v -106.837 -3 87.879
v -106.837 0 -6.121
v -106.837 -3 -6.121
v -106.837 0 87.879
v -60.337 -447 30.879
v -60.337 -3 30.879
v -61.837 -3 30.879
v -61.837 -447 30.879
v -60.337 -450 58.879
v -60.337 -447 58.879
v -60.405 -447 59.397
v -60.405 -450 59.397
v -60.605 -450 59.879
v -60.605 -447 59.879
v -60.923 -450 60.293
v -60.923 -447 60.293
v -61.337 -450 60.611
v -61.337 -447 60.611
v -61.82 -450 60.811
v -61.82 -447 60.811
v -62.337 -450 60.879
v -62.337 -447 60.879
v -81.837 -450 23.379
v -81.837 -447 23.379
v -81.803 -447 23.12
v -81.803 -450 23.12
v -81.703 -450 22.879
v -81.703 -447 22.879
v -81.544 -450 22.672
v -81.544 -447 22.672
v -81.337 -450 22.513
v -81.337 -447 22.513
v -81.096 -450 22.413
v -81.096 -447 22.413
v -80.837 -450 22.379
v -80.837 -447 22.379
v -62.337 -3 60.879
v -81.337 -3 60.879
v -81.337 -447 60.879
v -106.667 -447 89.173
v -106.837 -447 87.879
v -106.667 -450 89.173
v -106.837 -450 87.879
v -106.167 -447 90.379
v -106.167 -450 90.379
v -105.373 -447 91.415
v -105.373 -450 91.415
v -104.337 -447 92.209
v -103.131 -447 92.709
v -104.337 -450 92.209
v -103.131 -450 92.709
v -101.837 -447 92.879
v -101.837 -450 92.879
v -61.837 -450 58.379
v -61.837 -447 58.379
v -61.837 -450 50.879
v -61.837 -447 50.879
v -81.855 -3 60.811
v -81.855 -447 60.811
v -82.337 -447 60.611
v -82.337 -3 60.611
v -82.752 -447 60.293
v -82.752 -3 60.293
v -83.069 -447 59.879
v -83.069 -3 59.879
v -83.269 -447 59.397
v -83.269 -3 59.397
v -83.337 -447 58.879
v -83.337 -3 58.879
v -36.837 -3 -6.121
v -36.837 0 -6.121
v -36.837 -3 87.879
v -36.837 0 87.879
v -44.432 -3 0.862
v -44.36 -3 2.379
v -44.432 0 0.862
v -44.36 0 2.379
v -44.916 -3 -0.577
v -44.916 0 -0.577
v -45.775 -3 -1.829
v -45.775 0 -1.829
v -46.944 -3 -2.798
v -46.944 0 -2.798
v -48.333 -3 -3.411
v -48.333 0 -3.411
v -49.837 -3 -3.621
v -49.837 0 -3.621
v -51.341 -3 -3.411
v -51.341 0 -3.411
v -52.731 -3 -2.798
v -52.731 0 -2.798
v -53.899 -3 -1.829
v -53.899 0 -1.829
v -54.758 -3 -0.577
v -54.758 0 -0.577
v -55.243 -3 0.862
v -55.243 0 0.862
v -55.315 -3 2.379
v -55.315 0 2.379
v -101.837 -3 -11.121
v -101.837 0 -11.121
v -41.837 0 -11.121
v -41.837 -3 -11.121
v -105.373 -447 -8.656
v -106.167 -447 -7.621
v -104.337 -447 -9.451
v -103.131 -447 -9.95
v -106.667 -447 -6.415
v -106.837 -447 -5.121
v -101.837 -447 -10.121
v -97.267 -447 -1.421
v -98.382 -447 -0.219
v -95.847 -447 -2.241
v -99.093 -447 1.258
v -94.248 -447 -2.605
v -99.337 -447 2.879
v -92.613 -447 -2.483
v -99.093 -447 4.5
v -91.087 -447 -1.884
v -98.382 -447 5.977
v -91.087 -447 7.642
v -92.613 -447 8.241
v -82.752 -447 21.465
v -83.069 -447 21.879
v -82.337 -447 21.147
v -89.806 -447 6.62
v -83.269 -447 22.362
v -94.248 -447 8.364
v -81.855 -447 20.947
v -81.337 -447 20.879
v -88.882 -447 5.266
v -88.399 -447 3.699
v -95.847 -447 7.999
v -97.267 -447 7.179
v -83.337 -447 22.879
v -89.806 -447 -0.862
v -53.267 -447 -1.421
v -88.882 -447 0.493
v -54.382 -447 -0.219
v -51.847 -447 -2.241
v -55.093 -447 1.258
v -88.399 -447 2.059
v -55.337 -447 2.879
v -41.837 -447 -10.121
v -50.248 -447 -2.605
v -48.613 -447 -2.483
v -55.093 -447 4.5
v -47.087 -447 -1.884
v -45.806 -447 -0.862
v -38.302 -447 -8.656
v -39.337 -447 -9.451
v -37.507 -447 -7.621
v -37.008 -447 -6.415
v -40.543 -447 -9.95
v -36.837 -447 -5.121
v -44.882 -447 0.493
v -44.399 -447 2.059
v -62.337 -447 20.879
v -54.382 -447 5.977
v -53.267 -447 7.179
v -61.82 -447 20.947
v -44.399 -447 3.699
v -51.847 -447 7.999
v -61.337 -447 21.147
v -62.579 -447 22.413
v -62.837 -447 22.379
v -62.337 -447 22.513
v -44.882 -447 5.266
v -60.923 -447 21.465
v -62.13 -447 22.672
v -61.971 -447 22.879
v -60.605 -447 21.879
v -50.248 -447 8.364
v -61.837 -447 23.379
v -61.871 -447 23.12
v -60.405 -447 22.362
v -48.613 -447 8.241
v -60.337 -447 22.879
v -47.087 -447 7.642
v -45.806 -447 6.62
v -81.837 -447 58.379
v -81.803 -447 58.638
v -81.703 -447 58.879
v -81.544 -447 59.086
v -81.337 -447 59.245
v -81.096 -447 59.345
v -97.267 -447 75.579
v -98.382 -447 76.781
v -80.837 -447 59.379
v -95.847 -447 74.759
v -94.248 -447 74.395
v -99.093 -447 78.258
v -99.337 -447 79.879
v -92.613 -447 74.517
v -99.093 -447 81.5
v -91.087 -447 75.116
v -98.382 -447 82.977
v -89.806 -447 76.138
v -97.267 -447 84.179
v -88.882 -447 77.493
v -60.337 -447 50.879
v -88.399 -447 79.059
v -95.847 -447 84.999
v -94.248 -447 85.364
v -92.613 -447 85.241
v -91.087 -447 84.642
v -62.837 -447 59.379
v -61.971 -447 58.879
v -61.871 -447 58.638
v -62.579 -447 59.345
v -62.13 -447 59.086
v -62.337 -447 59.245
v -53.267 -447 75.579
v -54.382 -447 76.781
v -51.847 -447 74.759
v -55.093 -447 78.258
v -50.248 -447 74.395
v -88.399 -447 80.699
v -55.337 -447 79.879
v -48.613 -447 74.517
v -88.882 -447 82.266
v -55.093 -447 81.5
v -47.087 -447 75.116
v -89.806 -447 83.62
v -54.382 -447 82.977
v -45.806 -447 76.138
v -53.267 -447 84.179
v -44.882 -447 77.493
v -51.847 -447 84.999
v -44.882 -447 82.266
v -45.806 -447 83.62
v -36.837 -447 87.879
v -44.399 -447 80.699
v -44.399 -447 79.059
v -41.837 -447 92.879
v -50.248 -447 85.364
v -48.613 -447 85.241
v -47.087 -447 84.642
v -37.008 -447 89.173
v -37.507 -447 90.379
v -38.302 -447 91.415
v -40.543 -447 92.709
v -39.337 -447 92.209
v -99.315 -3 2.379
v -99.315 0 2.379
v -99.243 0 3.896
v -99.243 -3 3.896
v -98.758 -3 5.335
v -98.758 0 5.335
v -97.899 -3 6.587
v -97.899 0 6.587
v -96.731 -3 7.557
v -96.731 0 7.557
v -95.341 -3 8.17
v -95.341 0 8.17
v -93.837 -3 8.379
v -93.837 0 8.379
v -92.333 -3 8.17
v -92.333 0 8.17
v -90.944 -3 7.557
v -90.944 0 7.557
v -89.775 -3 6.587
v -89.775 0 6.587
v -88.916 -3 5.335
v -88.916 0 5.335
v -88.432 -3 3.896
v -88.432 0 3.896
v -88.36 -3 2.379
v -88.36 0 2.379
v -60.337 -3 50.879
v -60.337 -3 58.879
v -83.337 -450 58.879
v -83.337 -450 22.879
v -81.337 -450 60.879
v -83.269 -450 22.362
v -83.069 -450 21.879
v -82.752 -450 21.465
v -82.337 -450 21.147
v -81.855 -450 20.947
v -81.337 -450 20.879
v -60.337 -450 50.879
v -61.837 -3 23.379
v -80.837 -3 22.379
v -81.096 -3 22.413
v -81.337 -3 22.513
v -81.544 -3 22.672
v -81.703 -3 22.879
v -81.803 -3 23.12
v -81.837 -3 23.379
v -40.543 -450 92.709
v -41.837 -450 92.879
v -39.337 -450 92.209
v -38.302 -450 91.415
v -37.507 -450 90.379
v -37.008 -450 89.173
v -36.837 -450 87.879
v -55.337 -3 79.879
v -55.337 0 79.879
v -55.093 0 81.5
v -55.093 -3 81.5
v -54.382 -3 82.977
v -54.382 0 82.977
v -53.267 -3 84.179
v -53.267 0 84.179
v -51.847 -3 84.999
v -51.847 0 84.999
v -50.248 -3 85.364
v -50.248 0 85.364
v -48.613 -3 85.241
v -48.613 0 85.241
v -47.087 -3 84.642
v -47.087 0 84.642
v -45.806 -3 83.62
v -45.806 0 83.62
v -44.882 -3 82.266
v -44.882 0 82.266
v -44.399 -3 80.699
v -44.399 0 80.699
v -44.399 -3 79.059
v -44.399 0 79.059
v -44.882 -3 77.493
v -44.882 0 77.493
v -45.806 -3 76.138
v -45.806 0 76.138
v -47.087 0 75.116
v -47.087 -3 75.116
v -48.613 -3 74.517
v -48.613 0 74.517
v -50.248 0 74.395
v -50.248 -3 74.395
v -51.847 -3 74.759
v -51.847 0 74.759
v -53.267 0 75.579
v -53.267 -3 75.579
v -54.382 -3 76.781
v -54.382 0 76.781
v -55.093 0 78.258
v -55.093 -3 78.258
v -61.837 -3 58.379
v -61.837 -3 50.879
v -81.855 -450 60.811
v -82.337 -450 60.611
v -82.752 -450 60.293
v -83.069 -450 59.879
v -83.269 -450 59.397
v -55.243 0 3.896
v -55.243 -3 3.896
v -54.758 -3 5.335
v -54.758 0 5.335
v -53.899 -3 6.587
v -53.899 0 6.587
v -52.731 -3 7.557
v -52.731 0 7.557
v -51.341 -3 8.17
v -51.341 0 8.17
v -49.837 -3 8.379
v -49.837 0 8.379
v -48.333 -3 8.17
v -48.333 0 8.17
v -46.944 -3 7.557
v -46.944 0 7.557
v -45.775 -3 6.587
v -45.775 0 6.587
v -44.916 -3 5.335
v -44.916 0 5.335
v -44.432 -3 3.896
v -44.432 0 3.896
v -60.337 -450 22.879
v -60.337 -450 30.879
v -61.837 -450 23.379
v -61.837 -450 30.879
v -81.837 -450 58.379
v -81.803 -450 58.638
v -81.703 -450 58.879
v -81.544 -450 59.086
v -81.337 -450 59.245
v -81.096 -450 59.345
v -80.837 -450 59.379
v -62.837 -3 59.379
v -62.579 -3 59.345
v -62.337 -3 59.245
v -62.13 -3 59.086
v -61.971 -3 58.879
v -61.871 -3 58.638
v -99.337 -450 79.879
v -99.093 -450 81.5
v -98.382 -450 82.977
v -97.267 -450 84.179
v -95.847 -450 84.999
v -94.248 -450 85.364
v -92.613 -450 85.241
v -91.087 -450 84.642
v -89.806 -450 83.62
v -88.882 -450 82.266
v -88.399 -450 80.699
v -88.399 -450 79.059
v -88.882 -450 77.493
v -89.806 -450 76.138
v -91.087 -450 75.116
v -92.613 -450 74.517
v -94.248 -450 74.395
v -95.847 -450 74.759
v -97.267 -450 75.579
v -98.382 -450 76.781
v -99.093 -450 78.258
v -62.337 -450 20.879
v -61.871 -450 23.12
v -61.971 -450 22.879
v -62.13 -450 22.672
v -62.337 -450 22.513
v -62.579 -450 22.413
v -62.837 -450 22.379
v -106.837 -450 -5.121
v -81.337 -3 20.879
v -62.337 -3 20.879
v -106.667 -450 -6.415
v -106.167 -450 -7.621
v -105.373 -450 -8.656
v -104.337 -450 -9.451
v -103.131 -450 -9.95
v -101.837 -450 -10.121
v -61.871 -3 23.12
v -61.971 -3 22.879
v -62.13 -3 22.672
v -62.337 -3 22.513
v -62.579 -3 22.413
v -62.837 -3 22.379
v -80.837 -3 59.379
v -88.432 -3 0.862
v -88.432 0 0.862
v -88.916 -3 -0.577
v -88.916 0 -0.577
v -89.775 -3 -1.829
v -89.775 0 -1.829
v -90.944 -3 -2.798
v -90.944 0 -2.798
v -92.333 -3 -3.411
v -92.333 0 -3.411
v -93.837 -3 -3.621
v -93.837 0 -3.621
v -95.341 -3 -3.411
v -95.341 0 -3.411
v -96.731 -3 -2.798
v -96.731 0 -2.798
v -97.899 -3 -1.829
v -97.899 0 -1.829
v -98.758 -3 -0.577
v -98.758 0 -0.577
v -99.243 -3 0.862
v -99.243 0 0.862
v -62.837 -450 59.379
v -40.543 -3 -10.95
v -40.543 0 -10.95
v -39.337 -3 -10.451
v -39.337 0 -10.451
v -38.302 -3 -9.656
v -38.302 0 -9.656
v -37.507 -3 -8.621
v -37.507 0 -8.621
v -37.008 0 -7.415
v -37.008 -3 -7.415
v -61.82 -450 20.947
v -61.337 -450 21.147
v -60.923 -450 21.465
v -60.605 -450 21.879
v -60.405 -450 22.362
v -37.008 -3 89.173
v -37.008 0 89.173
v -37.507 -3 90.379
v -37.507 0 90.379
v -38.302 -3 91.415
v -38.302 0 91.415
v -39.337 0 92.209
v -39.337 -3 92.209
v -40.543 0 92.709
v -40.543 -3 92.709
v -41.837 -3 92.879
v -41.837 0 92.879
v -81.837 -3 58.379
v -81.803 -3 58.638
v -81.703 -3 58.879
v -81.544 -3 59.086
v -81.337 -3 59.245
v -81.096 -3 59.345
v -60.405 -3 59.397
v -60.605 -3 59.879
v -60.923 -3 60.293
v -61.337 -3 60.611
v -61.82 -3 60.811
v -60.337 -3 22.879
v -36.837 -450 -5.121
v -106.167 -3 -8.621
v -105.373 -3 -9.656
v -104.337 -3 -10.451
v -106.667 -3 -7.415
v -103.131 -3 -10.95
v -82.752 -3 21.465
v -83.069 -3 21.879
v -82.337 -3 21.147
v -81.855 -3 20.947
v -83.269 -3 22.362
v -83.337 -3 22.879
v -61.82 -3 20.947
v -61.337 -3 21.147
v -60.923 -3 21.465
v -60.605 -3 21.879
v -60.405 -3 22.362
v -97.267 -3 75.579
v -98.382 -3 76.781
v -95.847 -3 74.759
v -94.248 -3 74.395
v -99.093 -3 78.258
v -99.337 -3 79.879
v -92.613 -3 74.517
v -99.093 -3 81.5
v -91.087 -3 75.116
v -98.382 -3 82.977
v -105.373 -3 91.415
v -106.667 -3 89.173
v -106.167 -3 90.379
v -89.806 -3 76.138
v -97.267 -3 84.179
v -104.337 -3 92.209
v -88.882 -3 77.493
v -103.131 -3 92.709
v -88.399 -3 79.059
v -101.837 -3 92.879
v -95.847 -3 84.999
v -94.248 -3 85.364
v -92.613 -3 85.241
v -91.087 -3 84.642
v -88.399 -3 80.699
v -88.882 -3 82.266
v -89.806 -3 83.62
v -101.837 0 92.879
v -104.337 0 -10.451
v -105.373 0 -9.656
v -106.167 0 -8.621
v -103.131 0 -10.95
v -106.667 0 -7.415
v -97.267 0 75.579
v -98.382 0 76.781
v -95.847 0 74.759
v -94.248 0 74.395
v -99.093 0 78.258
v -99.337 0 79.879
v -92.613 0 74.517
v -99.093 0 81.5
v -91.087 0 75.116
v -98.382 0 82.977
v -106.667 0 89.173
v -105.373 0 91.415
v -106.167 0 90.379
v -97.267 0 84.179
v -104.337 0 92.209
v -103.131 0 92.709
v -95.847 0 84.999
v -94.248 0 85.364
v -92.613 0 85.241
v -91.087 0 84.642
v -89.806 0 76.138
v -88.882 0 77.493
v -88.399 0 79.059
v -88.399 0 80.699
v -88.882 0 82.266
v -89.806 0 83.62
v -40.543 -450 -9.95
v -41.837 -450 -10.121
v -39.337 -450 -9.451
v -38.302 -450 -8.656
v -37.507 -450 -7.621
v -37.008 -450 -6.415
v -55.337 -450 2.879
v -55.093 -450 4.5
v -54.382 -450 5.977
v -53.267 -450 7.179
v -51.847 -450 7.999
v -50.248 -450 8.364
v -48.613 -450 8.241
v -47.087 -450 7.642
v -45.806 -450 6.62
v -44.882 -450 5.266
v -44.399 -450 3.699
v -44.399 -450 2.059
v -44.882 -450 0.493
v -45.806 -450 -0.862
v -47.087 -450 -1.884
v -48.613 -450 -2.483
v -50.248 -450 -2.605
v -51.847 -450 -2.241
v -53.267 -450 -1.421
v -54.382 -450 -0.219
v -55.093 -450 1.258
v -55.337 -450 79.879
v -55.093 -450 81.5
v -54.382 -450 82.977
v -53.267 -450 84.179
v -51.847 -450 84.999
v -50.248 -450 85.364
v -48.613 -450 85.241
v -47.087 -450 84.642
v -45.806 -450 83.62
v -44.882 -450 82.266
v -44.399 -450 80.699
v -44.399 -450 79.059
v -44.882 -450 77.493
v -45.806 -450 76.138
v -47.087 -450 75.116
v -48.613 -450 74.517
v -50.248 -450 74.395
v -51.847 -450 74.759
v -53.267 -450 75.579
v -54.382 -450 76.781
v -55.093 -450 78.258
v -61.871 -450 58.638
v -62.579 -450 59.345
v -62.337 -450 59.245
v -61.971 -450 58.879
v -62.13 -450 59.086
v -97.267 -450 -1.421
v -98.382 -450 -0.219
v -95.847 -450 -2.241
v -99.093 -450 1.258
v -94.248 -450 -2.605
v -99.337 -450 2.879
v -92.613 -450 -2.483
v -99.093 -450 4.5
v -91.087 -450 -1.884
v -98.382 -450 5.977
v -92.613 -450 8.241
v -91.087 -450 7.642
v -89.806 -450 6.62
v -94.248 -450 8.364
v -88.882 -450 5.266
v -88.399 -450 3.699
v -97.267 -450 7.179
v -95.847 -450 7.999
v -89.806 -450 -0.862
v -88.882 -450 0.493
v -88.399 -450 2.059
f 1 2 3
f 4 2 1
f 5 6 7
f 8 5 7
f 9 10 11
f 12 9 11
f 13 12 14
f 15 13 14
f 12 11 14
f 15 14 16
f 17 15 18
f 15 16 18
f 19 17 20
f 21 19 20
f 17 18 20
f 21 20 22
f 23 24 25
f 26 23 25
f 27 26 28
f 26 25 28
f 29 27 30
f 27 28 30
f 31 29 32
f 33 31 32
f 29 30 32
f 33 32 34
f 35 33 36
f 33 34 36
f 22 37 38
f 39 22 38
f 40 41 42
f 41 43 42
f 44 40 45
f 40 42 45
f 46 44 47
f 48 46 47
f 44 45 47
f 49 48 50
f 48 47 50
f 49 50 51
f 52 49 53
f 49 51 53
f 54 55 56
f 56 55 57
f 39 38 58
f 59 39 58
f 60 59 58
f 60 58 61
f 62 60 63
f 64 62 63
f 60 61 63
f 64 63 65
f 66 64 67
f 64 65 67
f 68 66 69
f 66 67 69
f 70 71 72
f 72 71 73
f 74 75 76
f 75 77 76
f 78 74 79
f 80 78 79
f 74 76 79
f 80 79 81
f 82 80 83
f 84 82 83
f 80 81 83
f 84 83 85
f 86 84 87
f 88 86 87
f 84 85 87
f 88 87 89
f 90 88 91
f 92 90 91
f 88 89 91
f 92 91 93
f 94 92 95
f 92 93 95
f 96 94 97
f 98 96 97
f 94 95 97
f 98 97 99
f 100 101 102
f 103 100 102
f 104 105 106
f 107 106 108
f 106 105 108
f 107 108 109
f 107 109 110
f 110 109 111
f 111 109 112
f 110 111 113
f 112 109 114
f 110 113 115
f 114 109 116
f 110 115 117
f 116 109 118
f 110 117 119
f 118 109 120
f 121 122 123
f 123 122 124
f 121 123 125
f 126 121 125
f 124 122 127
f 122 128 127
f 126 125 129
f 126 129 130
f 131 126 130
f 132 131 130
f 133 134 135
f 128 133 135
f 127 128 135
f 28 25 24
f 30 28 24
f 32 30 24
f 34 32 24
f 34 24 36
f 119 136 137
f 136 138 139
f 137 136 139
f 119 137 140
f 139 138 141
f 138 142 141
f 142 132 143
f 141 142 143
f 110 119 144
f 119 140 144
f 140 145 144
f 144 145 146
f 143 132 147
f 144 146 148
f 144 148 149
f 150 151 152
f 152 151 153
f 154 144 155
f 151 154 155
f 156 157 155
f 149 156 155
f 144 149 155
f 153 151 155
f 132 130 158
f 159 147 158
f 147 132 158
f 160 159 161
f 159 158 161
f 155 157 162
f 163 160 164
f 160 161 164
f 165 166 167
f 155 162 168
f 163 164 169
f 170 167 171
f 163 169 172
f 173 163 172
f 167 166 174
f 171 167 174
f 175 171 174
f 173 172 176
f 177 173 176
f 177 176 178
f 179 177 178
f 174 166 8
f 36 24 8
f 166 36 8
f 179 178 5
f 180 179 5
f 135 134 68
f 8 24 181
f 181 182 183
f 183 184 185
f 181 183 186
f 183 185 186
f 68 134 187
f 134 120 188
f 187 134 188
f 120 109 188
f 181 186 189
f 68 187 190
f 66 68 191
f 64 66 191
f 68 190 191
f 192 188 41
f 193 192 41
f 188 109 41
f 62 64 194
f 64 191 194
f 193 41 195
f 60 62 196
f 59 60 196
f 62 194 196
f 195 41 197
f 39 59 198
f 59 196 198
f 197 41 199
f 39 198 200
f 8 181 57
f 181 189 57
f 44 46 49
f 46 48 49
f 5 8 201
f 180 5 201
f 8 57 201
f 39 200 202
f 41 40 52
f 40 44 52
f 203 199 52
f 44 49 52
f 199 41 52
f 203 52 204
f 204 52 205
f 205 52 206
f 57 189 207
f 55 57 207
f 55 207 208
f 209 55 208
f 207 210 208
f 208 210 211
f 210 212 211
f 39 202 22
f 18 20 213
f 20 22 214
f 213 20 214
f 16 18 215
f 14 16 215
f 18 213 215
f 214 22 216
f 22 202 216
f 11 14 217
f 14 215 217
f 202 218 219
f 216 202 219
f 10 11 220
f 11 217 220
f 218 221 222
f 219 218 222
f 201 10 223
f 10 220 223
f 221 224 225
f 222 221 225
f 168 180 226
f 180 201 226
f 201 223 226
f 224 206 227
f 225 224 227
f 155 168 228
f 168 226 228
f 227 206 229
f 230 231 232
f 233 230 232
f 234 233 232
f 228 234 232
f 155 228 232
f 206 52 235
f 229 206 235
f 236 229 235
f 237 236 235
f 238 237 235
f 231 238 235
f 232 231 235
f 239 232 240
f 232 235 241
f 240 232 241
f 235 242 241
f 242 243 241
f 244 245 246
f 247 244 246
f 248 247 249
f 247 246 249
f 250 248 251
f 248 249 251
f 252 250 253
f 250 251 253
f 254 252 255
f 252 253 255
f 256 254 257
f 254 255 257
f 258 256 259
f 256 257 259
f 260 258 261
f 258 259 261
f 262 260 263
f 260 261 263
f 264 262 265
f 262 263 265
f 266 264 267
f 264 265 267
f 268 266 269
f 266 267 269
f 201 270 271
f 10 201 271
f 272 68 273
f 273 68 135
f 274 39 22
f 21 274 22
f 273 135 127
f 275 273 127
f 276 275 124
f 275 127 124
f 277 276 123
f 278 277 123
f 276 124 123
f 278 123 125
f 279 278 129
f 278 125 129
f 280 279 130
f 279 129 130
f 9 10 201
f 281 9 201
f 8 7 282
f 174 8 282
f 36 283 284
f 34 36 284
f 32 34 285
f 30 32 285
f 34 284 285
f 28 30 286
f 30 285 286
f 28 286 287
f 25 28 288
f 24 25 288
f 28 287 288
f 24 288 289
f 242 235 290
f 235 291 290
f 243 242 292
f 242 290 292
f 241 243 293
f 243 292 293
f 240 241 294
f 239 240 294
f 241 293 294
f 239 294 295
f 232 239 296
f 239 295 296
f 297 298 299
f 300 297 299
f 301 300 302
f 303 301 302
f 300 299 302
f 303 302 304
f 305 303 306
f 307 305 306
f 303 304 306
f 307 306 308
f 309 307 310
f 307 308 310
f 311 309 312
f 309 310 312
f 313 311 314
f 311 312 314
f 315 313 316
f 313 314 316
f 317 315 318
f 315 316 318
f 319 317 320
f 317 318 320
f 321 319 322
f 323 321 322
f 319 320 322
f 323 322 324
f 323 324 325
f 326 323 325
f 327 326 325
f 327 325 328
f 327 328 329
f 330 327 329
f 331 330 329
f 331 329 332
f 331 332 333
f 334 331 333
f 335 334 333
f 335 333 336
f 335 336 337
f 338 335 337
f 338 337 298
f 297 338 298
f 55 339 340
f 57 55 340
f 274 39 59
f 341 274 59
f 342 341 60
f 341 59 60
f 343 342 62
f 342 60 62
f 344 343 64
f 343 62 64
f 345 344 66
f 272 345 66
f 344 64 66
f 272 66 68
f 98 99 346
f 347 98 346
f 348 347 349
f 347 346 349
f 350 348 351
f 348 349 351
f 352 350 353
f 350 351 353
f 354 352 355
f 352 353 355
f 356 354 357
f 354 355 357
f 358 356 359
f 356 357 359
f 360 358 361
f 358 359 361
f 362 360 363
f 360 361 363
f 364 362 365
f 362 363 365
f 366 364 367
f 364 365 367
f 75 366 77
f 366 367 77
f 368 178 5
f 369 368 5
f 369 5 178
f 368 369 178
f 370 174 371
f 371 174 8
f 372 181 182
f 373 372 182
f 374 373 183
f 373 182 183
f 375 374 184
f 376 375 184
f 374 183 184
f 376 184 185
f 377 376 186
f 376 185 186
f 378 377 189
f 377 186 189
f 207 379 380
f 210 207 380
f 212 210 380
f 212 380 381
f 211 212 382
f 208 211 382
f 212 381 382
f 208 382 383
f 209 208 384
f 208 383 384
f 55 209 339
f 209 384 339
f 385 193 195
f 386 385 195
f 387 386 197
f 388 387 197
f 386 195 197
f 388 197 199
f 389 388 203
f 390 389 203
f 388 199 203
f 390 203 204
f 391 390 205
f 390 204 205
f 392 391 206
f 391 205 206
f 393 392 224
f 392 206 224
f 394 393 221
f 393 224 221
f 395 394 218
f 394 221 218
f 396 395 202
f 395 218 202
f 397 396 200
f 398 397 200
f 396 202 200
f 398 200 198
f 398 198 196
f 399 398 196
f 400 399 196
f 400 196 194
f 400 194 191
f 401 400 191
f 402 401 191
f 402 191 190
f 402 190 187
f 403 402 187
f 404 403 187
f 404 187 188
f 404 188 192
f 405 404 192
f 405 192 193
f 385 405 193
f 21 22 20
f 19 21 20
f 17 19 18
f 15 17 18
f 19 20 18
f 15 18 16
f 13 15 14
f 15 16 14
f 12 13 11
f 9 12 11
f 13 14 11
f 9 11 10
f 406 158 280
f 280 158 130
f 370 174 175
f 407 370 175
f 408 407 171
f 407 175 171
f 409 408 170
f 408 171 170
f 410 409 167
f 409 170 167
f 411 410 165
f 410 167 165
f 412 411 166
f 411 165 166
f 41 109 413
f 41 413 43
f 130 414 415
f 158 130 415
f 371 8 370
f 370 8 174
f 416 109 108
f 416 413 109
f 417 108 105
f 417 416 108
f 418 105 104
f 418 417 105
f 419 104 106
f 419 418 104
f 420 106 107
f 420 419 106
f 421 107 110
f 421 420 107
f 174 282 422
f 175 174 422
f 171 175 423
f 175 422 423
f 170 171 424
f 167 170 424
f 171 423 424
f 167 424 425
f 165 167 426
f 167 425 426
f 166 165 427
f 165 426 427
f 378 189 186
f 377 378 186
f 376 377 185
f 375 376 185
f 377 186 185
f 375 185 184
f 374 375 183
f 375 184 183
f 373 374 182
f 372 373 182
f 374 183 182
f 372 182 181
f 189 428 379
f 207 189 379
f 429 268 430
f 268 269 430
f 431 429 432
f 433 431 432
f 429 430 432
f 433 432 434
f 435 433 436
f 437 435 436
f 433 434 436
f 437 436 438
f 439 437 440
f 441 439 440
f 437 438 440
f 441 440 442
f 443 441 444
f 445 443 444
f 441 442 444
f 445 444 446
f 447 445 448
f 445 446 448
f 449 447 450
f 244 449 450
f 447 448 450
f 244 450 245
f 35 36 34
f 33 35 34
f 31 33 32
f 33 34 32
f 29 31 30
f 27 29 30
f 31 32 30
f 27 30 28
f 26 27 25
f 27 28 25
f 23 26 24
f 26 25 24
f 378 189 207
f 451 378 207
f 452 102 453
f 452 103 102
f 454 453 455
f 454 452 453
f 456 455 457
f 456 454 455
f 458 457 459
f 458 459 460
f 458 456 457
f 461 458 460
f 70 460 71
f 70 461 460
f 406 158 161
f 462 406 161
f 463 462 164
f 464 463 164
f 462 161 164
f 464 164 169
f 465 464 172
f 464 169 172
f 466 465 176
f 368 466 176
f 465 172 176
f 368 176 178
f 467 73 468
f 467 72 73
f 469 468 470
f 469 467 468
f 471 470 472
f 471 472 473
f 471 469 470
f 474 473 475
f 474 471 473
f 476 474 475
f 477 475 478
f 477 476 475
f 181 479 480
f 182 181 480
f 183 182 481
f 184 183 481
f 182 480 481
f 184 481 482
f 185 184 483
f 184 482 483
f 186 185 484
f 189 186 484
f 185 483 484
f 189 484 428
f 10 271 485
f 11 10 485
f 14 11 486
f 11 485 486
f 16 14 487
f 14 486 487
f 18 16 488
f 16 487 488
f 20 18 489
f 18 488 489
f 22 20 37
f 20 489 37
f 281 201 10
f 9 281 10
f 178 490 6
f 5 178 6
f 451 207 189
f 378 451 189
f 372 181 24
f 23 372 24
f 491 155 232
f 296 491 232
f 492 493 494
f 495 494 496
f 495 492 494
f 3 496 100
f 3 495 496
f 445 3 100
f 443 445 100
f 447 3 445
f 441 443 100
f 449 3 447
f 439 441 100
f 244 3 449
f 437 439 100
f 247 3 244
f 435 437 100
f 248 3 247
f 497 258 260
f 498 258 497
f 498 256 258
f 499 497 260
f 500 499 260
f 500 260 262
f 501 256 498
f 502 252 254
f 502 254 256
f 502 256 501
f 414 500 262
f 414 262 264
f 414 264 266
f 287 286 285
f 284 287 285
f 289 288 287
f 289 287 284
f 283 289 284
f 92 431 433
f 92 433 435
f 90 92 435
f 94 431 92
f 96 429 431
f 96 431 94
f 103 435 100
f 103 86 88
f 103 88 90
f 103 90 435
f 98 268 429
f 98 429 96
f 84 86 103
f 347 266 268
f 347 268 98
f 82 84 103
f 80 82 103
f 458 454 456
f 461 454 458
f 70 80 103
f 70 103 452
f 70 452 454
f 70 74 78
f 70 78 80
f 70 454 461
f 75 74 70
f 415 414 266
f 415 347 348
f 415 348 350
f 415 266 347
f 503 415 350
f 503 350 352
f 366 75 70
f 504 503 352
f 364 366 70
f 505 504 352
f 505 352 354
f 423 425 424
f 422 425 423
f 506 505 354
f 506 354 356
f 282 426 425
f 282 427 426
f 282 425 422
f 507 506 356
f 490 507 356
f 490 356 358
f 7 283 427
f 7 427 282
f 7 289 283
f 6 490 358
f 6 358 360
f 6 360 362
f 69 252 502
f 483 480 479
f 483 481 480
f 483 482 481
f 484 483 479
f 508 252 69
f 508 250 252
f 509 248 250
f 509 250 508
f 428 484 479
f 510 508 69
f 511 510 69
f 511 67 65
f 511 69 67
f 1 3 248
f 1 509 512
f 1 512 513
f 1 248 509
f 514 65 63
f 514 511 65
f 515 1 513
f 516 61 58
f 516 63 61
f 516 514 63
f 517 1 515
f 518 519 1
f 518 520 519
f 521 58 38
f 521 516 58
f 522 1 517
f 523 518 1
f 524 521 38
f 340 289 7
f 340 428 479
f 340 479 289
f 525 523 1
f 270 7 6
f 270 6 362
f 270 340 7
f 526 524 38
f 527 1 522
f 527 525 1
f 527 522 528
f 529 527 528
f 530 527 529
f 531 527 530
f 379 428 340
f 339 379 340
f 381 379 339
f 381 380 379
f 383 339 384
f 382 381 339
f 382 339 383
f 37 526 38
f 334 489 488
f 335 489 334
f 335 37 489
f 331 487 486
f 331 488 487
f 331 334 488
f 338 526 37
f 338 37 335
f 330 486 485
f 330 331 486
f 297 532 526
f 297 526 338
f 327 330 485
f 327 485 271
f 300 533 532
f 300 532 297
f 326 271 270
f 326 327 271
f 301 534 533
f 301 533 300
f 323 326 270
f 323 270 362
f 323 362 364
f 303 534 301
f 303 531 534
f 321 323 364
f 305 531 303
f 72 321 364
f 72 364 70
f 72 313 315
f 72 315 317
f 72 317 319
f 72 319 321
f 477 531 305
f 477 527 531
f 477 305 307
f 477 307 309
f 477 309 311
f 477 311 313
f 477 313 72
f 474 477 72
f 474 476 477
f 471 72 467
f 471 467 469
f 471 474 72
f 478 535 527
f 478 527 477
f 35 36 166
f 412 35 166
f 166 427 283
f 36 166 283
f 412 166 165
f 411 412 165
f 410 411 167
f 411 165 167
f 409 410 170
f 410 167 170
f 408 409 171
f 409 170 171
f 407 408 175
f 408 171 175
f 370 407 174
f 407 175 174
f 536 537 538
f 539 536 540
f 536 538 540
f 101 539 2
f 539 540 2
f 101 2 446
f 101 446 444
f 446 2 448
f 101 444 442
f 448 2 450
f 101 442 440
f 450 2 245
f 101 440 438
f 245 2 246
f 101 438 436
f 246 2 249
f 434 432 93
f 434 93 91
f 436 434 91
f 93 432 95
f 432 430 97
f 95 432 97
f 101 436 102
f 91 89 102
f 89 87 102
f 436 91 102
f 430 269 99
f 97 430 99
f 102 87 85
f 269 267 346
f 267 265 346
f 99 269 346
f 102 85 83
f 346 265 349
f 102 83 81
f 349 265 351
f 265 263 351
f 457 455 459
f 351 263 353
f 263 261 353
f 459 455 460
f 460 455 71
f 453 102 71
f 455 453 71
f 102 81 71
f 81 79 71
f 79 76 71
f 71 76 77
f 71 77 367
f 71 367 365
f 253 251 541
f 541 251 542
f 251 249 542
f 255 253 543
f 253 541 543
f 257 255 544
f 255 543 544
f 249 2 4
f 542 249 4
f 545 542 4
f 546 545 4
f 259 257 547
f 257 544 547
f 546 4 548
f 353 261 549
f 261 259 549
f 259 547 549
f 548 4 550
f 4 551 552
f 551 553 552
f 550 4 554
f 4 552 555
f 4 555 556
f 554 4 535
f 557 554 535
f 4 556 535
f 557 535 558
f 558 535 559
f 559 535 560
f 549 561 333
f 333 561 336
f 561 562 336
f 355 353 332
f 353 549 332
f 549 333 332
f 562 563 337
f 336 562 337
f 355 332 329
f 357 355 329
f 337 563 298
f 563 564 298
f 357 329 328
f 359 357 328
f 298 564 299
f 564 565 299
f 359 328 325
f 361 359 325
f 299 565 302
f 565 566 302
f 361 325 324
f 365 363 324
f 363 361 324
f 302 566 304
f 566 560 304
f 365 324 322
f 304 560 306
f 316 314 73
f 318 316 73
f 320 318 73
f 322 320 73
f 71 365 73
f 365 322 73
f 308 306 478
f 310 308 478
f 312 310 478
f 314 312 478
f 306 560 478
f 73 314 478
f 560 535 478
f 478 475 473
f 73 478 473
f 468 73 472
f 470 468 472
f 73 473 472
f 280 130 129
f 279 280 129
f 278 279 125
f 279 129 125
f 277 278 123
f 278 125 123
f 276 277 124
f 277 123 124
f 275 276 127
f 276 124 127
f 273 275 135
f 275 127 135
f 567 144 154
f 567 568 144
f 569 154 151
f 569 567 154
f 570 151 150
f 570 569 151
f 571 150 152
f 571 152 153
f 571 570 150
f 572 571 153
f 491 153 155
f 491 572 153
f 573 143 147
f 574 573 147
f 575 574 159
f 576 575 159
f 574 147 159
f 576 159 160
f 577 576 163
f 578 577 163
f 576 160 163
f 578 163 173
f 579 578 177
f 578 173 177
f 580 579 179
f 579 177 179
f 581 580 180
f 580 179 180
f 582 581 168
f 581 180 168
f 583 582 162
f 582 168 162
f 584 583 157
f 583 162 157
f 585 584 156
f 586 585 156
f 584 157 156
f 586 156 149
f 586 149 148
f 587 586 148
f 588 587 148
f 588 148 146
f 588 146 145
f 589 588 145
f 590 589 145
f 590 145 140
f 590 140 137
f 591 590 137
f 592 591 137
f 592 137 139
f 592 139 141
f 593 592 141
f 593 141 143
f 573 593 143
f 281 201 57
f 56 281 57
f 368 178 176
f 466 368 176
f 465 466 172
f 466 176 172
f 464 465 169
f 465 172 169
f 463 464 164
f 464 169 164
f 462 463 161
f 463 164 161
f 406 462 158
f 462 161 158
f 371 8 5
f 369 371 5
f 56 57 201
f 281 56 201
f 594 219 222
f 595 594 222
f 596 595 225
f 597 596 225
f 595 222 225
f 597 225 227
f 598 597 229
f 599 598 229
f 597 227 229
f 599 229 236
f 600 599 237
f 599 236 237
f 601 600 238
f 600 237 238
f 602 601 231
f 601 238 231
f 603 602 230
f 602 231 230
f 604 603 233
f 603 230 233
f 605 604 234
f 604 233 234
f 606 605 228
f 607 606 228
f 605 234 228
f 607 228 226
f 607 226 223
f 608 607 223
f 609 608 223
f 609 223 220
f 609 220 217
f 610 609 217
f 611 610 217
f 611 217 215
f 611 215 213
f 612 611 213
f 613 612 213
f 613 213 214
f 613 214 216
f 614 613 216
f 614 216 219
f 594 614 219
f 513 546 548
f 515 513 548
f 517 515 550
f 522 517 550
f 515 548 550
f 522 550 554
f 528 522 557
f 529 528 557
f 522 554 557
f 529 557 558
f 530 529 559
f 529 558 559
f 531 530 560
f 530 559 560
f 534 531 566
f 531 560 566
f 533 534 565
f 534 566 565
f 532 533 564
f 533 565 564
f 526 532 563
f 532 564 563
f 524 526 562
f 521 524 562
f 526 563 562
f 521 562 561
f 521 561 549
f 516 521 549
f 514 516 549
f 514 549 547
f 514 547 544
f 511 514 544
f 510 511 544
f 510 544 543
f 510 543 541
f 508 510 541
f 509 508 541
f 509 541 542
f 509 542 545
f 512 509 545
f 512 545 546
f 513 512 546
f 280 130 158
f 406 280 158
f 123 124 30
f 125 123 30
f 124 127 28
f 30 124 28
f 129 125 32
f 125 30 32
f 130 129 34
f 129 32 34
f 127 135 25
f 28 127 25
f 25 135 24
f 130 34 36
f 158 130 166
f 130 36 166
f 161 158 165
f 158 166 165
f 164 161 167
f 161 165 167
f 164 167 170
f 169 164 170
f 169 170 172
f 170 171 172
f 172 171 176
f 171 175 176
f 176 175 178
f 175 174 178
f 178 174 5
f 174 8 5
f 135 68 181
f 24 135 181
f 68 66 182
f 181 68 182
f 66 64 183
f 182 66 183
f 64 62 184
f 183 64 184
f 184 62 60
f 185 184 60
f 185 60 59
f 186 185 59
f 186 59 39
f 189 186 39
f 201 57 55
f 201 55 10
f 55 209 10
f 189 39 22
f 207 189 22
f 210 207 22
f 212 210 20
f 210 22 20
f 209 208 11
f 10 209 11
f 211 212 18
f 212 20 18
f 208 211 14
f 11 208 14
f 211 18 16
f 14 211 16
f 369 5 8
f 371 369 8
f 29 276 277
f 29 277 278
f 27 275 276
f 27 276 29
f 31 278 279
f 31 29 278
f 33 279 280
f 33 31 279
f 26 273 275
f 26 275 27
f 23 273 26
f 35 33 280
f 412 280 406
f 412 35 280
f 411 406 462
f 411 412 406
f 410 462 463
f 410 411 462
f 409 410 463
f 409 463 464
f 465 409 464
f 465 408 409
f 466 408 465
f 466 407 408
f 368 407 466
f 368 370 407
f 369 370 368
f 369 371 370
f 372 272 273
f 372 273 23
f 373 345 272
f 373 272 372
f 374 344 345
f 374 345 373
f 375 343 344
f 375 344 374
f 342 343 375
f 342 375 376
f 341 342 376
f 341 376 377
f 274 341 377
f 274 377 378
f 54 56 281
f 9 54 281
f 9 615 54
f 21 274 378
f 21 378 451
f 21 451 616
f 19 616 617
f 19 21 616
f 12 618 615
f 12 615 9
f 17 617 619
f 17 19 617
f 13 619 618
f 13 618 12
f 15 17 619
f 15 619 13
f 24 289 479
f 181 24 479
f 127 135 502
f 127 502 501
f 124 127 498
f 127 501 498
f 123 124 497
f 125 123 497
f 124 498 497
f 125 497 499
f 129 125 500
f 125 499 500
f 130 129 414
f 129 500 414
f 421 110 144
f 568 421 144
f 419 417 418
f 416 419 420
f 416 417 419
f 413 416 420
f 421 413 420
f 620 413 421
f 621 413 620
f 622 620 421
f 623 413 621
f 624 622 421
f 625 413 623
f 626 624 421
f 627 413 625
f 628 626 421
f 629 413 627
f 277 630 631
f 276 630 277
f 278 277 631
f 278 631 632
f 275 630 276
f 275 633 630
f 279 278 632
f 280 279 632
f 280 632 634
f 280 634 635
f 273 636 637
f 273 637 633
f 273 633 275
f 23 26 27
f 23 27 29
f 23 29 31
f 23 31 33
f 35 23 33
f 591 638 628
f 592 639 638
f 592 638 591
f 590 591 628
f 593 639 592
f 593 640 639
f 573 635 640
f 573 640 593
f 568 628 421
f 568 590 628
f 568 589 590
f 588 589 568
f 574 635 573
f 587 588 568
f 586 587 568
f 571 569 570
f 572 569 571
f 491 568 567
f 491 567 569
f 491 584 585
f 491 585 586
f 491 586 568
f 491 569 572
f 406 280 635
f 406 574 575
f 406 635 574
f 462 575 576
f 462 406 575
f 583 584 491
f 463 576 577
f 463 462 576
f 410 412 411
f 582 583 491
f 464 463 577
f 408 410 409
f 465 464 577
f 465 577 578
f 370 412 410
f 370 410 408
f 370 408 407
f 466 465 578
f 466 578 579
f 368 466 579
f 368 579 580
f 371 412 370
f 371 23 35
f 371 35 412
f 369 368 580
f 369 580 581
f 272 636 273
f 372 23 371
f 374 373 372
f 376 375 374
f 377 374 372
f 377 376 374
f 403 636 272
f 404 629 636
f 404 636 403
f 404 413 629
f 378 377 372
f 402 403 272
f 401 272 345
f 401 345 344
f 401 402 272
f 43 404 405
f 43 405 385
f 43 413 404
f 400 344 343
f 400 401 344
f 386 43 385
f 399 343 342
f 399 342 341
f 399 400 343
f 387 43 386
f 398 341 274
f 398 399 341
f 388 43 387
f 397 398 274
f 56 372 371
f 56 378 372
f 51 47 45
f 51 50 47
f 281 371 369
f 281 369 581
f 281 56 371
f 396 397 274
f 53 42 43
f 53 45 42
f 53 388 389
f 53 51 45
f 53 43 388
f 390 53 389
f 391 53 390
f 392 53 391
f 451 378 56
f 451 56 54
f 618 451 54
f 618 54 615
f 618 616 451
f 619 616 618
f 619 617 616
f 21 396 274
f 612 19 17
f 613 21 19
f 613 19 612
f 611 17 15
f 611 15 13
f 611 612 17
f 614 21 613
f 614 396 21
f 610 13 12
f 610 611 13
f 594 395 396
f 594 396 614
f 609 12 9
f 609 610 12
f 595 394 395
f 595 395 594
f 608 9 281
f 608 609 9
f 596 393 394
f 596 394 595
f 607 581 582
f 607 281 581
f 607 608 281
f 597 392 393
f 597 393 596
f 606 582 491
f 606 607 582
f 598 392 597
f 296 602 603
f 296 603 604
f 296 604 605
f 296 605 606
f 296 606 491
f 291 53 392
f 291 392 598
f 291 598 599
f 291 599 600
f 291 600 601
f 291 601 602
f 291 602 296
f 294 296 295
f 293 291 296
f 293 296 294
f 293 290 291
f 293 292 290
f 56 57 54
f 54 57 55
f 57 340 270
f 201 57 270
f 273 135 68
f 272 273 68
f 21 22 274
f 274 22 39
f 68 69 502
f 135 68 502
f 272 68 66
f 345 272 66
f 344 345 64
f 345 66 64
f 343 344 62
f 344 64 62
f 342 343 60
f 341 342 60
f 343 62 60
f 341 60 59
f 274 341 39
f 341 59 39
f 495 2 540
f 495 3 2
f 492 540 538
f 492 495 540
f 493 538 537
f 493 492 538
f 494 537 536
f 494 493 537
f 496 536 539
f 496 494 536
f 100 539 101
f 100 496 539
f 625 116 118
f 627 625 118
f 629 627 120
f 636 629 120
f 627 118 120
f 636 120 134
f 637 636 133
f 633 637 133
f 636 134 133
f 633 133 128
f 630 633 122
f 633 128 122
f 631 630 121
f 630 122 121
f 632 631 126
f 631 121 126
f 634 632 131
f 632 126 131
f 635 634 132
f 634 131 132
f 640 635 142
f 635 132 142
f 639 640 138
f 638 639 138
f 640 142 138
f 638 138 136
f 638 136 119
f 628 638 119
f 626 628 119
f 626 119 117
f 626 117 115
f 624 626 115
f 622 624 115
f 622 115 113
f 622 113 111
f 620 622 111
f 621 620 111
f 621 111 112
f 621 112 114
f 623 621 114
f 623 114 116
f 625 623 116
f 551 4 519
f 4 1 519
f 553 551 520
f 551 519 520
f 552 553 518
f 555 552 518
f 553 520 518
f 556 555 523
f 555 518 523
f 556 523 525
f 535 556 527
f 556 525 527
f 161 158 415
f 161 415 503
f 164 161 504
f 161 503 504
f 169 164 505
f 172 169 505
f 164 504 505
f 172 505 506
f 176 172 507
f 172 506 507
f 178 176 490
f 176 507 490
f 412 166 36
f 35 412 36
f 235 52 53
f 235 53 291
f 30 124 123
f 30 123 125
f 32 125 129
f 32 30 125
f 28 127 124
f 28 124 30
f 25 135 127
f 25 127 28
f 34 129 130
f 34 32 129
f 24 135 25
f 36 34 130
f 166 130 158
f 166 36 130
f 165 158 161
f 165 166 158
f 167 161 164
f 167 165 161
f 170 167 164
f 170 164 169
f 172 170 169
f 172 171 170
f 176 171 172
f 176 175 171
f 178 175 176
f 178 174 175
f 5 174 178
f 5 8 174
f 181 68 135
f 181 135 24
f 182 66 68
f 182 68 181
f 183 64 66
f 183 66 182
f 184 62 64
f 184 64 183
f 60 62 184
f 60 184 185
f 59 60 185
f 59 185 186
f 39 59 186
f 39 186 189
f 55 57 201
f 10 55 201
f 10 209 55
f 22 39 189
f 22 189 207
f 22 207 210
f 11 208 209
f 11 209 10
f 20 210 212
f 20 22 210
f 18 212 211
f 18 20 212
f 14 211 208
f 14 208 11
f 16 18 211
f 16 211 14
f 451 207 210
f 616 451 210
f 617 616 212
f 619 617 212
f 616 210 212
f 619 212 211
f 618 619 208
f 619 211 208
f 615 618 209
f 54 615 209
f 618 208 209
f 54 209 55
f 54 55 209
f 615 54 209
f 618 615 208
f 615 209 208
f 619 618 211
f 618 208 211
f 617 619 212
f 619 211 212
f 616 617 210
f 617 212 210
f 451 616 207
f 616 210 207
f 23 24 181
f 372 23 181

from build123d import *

# Parameters (mm, degrees)
F0_W     = 70
F0_H     = 104
F1_DEPTH = 3
F2_R     = 5
F4_D     = 11
F6_DEPTH = 444
F7_W     = 70
F7_H     = 103
F8_DEPTH = 3
F9_DEPTH = 3
F10_R    = 5
F12_D    = 11
F12_2_D  = 11


with BuildPart() as f1:
    # F0 (on Front) → F1 (new body)
    with BuildSketch(Plane.XZ):
        with Locations((-71.837332, 40.87914)):
            Rectangle(F0_W, F0_H)
    extrude(amount=F1_DEPTH)

    # F2
    f2_edges = [f1.edges().sort_by_distance(p)[0] for p in [
        (-36.837332, -1.5, 92.87914),
        (-106.837332, -1.5, 92.87914),
        (-106.837332, -1.5, -11.12086),
        (-36.837332, -1.5, -11.12086),
    ]]
    fillet(f2_edges, radius=F2_R)

    # F4 (through all)
    with Locations(Plane.XZ.offset(3)):
        with Locations((-49.837332, 1.87914), (-93.837332, 1.87914), (-93.837332, 79.87914), (-49.837332, 79.87914)):
            Hole(F4_D / 2)

    # F5 (on face) → F6 (join)
    with BuildSketch(Plane.XZ.offset(3)):
        with BuildLine():
            ThreePointArc((-60.337332, 58.87914), (-60.923118, 60.293354), (-62.337332, 60.87914))
            Line((-62.337332, 60.87914), (-81.337332, 60.87914))
            ThreePointArc((-81.337332, 60.87914), (-82.751546, 60.293354), (-83.337332, 58.87914))
            Line((-83.337332, 58.87914), (-83.337332, 22.87914))
            ThreePointArc((-83.337332, 22.87914), (-82.751546, 21.464927), (-81.337332, 20.87914))
            Line((-81.337332, 20.87914), (-62.337332, 20.87914))
            ThreePointArc((-62.337332, 20.87914), (-60.923118, 21.464927), (-60.337332, 22.87914))
            Line((-60.337332, 22.87914), (-60.337332, 30.87914))
            Line((-60.337332, 30.87914), (-61.837332, 30.87914))
            Line((-61.837332, 30.87914), (-61.837332, 23.37914))
            ThreePointArc((-61.837332, 23.37914), (-62.130225, 22.672034), (-62.837332, 22.37914))
            Line((-62.837332, 22.37914), (-80.837332, 22.37914))
            ThreePointArc((-80.837332, 22.37914), (-81.544439, 22.672034), (-81.837332, 23.37914))
            Line((-81.837332, 23.37914), (-81.837332, 58.37914))
            ThreePointArc((-81.837332, 58.37914), (-81.544439, 59.086247), (-80.837332, 59.37914))
            Line((-80.837332, 59.37914), (-62.837332, 59.37914))
            ThreePointArc((-62.837332, 59.37914), (-62.130225, 59.086247), (-61.837332, 58.37914))
            Line((-61.837332, 58.37914), (-61.837332, 50.87914))
            Line((-61.837332, 50.87914), (-60.337332, 50.87914))
            Line((-60.337332, 50.87914), (-60.337332, 58.87914))
        make_face()
    extrude(amount=F6_DEPTH)

    # F12 (through all)
    with Locations(Plane.XZ.offset(450)):
        with Locations((-93.837332, 79.87914), (-49.837332, 79.87914), (-49.837332, 2.87914), (-93.837332, 2.87914)):
            Hole(F12_D / 2)


with BuildPart() as f8:
    # F7 (on face) → F8 (new body)
    with BuildSketch(Plane.XZ.offset(447)):
        with Locations((-71.837332, 41.37914)):
            Rectangle(F7_W, F7_H)
        with BuildLine():
            Line((-61.837332, 50.87914), (-61.837332, 58.37914))
            ThreePointArc((-61.837332, 58.37914), (-62.130225, 59.086247), (-62.837332, 59.37914))
            Line((-62.837332, 59.37914), (-80.837332, 59.37914))
            ThreePointArc((-80.837332, 59.37914), (-81.544439, 59.086247), (-81.837332, 58.37914))
            Line((-81.837332, 58.37914), (-81.837332, 23.37914))
            ThreePointArc((-81.837332, 23.37914), (-81.544439, 22.672034), (-80.837332, 22.37914))
            Line((-80.837332, 22.37914), (-62.837332, 22.37914))
            ThreePointArc((-62.837332, 22.37914), (-62.130225, 22.672034), (-61.837332, 23.37914))
            Line((-61.837332, 23.37914), (-61.837332, 30.87914))
            Line((-61.837332, 30.87914), (-60.337332, 30.87914))
            Line((-60.337332, 30.87914), (-60.337332, 22.87914))
            ThreePointArc((-60.337332, 22.87914), (-60.923118, 21.464927), (-62.337332, 20.87914))
            Line((-62.337332, 20.87914), (-81.337332, 20.87914))
            ThreePointArc((-81.337332, 20.87914), (-82.751546, 21.464927), (-83.337332, 22.87914))
            Line((-83.337332, 22.87914), (-83.337332, 58.87914))
            ThreePointArc((-83.337332, 58.87914), (-82.751546, 60.293354), (-81.337332, 60.87914))
            Line((-81.337332, 60.87914), (-62.337332, 60.87914))
            ThreePointArc((-62.337332, 60.87914), (-60.923118, 60.293354), (-60.337332, 58.87914))
            Line((-60.337332, 58.87914), (-60.337332, 50.87914))
            Line((-60.337332, 50.87914), (-61.837332, 50.87914))
        make_face(mode=Mode.SUBTRACT)
    extrude(amount=F8_DEPTH)

    # F10
    f10_edges = [f8.edges().sort_by_distance(p)[0] for p in [
        (-36.837332, -448.5, 92.87914),
        (-106.837332, -448.5, 92.87914),
        (-106.837332, -448.5, -10.12086),
        (-36.837332, -448.5, -10.12086),
    ]]
    fillet(f10_edges, radius=F10_R)

    # F12#2 (through all)
    with Locations(Plane.XZ.offset(450)):
        with Locations((-93.837332, 79.87914), (-49.837332, 79.87914), (-49.837332, 2.87914), (-93.837332, 2.87914)):
            Hole(F12_2_D / 2)


with BuildPart() as f9:
    # F6_face (on face) → F9 (new body)
    with BuildSketch(Plane(origin=(-74.024888, -447, 40.87914), x_dir=(1, 0, 0), z_dir=(0, -1, 0))):
        with BuildLine():
            Line((12.187556, 17.5), (12.187556, 10))
            Line((12.187556, 10), (13.687556, 10))
            Line((13.687556, 10), (13.687556, 18))
            ThreePointArc((13.687556, 18), (13.10177, 19.414214), (11.687556, 20))
            Line((11.687556, 20), (-7.312444, 20))
            ThreePointArc((-7.312444, 20), (-8.726657, 19.414214), (-9.312444, 18))
            Line((-9.312444, 18), (-9.312444, -18))
            ThreePointArc((-9.312444, -18), (-8.726657, -19.414214), (-7.312444, -20))
            Line((-7.312444, -20), (11.687556, -20))
            ThreePointArc((11.687556, -20), (13.10177, -19.414214), (13.687556, -18))
            Line((13.687556, -18), (13.687556, -10))
            Line((13.687556, -10), (12.187556, -10))
            Line((12.187556, -10), (12.187556, -17.5))
            ThreePointArc((12.187556, -17.5), (11.894663, -18.207107), (11.187556, -18.5))
            Line((11.187556, -18.5), (-6.812444, -18.5))
            ThreePointArc((-6.812444, -18.5), (-7.51955, -18.207107), (-7.812444, -17.5))
            Line((-7.812444, -17.5), (-7.812444, 17.5))
            ThreePointArc((-7.812444, 17.5), (-7.51955, 18.207107), (-6.812444, 18.5))
            Line((-6.812444, 18.5), (11.187556, 18.5))
            ThreePointArc((11.187556, 18.5), (11.894663, 18.207107), (12.187556, 17.5))
        make_face()
    extrude(amount=F9_DEPTH)


solid = Compound([f1.part, f8.part, f9.part])
